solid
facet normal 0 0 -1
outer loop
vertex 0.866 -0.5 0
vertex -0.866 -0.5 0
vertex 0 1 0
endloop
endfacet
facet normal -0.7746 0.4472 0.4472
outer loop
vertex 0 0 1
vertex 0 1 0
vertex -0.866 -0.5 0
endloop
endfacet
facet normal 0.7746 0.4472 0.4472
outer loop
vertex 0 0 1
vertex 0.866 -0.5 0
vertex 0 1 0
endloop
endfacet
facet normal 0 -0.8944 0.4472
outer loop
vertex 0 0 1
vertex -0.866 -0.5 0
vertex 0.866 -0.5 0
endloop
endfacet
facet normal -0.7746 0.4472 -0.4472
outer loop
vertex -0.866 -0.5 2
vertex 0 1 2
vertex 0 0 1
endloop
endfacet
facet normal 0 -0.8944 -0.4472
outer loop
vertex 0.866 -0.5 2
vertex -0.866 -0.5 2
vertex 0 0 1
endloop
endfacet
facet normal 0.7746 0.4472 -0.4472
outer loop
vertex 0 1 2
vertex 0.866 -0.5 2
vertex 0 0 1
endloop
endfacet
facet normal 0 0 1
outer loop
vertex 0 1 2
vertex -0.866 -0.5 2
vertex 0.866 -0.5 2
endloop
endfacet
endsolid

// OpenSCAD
h = 1;

polyhedron(
  points=[
    [0,1,0],
    [cos(210), sin(210),0],
    [cos(330), sin(330),0],

    [0,0,h],
    [0,0,h],
    [0,0,h],

    [0,1,2*h],
    [cos(210), sin(210),2*h],
    [cos(330), sin(330),2*h],
  ],
  faces=[
    [0,1,2],
    [1,0,3],[1,3,4],
    [0,2,5],[0,5,3],
    [2,1,4],[2,4,5],

    [4,3,6],[4,6,7],
    [5,4,7],[5,7,8],
    [3,5,8],[3,8,6],
    [8,7,6],
  ]);
